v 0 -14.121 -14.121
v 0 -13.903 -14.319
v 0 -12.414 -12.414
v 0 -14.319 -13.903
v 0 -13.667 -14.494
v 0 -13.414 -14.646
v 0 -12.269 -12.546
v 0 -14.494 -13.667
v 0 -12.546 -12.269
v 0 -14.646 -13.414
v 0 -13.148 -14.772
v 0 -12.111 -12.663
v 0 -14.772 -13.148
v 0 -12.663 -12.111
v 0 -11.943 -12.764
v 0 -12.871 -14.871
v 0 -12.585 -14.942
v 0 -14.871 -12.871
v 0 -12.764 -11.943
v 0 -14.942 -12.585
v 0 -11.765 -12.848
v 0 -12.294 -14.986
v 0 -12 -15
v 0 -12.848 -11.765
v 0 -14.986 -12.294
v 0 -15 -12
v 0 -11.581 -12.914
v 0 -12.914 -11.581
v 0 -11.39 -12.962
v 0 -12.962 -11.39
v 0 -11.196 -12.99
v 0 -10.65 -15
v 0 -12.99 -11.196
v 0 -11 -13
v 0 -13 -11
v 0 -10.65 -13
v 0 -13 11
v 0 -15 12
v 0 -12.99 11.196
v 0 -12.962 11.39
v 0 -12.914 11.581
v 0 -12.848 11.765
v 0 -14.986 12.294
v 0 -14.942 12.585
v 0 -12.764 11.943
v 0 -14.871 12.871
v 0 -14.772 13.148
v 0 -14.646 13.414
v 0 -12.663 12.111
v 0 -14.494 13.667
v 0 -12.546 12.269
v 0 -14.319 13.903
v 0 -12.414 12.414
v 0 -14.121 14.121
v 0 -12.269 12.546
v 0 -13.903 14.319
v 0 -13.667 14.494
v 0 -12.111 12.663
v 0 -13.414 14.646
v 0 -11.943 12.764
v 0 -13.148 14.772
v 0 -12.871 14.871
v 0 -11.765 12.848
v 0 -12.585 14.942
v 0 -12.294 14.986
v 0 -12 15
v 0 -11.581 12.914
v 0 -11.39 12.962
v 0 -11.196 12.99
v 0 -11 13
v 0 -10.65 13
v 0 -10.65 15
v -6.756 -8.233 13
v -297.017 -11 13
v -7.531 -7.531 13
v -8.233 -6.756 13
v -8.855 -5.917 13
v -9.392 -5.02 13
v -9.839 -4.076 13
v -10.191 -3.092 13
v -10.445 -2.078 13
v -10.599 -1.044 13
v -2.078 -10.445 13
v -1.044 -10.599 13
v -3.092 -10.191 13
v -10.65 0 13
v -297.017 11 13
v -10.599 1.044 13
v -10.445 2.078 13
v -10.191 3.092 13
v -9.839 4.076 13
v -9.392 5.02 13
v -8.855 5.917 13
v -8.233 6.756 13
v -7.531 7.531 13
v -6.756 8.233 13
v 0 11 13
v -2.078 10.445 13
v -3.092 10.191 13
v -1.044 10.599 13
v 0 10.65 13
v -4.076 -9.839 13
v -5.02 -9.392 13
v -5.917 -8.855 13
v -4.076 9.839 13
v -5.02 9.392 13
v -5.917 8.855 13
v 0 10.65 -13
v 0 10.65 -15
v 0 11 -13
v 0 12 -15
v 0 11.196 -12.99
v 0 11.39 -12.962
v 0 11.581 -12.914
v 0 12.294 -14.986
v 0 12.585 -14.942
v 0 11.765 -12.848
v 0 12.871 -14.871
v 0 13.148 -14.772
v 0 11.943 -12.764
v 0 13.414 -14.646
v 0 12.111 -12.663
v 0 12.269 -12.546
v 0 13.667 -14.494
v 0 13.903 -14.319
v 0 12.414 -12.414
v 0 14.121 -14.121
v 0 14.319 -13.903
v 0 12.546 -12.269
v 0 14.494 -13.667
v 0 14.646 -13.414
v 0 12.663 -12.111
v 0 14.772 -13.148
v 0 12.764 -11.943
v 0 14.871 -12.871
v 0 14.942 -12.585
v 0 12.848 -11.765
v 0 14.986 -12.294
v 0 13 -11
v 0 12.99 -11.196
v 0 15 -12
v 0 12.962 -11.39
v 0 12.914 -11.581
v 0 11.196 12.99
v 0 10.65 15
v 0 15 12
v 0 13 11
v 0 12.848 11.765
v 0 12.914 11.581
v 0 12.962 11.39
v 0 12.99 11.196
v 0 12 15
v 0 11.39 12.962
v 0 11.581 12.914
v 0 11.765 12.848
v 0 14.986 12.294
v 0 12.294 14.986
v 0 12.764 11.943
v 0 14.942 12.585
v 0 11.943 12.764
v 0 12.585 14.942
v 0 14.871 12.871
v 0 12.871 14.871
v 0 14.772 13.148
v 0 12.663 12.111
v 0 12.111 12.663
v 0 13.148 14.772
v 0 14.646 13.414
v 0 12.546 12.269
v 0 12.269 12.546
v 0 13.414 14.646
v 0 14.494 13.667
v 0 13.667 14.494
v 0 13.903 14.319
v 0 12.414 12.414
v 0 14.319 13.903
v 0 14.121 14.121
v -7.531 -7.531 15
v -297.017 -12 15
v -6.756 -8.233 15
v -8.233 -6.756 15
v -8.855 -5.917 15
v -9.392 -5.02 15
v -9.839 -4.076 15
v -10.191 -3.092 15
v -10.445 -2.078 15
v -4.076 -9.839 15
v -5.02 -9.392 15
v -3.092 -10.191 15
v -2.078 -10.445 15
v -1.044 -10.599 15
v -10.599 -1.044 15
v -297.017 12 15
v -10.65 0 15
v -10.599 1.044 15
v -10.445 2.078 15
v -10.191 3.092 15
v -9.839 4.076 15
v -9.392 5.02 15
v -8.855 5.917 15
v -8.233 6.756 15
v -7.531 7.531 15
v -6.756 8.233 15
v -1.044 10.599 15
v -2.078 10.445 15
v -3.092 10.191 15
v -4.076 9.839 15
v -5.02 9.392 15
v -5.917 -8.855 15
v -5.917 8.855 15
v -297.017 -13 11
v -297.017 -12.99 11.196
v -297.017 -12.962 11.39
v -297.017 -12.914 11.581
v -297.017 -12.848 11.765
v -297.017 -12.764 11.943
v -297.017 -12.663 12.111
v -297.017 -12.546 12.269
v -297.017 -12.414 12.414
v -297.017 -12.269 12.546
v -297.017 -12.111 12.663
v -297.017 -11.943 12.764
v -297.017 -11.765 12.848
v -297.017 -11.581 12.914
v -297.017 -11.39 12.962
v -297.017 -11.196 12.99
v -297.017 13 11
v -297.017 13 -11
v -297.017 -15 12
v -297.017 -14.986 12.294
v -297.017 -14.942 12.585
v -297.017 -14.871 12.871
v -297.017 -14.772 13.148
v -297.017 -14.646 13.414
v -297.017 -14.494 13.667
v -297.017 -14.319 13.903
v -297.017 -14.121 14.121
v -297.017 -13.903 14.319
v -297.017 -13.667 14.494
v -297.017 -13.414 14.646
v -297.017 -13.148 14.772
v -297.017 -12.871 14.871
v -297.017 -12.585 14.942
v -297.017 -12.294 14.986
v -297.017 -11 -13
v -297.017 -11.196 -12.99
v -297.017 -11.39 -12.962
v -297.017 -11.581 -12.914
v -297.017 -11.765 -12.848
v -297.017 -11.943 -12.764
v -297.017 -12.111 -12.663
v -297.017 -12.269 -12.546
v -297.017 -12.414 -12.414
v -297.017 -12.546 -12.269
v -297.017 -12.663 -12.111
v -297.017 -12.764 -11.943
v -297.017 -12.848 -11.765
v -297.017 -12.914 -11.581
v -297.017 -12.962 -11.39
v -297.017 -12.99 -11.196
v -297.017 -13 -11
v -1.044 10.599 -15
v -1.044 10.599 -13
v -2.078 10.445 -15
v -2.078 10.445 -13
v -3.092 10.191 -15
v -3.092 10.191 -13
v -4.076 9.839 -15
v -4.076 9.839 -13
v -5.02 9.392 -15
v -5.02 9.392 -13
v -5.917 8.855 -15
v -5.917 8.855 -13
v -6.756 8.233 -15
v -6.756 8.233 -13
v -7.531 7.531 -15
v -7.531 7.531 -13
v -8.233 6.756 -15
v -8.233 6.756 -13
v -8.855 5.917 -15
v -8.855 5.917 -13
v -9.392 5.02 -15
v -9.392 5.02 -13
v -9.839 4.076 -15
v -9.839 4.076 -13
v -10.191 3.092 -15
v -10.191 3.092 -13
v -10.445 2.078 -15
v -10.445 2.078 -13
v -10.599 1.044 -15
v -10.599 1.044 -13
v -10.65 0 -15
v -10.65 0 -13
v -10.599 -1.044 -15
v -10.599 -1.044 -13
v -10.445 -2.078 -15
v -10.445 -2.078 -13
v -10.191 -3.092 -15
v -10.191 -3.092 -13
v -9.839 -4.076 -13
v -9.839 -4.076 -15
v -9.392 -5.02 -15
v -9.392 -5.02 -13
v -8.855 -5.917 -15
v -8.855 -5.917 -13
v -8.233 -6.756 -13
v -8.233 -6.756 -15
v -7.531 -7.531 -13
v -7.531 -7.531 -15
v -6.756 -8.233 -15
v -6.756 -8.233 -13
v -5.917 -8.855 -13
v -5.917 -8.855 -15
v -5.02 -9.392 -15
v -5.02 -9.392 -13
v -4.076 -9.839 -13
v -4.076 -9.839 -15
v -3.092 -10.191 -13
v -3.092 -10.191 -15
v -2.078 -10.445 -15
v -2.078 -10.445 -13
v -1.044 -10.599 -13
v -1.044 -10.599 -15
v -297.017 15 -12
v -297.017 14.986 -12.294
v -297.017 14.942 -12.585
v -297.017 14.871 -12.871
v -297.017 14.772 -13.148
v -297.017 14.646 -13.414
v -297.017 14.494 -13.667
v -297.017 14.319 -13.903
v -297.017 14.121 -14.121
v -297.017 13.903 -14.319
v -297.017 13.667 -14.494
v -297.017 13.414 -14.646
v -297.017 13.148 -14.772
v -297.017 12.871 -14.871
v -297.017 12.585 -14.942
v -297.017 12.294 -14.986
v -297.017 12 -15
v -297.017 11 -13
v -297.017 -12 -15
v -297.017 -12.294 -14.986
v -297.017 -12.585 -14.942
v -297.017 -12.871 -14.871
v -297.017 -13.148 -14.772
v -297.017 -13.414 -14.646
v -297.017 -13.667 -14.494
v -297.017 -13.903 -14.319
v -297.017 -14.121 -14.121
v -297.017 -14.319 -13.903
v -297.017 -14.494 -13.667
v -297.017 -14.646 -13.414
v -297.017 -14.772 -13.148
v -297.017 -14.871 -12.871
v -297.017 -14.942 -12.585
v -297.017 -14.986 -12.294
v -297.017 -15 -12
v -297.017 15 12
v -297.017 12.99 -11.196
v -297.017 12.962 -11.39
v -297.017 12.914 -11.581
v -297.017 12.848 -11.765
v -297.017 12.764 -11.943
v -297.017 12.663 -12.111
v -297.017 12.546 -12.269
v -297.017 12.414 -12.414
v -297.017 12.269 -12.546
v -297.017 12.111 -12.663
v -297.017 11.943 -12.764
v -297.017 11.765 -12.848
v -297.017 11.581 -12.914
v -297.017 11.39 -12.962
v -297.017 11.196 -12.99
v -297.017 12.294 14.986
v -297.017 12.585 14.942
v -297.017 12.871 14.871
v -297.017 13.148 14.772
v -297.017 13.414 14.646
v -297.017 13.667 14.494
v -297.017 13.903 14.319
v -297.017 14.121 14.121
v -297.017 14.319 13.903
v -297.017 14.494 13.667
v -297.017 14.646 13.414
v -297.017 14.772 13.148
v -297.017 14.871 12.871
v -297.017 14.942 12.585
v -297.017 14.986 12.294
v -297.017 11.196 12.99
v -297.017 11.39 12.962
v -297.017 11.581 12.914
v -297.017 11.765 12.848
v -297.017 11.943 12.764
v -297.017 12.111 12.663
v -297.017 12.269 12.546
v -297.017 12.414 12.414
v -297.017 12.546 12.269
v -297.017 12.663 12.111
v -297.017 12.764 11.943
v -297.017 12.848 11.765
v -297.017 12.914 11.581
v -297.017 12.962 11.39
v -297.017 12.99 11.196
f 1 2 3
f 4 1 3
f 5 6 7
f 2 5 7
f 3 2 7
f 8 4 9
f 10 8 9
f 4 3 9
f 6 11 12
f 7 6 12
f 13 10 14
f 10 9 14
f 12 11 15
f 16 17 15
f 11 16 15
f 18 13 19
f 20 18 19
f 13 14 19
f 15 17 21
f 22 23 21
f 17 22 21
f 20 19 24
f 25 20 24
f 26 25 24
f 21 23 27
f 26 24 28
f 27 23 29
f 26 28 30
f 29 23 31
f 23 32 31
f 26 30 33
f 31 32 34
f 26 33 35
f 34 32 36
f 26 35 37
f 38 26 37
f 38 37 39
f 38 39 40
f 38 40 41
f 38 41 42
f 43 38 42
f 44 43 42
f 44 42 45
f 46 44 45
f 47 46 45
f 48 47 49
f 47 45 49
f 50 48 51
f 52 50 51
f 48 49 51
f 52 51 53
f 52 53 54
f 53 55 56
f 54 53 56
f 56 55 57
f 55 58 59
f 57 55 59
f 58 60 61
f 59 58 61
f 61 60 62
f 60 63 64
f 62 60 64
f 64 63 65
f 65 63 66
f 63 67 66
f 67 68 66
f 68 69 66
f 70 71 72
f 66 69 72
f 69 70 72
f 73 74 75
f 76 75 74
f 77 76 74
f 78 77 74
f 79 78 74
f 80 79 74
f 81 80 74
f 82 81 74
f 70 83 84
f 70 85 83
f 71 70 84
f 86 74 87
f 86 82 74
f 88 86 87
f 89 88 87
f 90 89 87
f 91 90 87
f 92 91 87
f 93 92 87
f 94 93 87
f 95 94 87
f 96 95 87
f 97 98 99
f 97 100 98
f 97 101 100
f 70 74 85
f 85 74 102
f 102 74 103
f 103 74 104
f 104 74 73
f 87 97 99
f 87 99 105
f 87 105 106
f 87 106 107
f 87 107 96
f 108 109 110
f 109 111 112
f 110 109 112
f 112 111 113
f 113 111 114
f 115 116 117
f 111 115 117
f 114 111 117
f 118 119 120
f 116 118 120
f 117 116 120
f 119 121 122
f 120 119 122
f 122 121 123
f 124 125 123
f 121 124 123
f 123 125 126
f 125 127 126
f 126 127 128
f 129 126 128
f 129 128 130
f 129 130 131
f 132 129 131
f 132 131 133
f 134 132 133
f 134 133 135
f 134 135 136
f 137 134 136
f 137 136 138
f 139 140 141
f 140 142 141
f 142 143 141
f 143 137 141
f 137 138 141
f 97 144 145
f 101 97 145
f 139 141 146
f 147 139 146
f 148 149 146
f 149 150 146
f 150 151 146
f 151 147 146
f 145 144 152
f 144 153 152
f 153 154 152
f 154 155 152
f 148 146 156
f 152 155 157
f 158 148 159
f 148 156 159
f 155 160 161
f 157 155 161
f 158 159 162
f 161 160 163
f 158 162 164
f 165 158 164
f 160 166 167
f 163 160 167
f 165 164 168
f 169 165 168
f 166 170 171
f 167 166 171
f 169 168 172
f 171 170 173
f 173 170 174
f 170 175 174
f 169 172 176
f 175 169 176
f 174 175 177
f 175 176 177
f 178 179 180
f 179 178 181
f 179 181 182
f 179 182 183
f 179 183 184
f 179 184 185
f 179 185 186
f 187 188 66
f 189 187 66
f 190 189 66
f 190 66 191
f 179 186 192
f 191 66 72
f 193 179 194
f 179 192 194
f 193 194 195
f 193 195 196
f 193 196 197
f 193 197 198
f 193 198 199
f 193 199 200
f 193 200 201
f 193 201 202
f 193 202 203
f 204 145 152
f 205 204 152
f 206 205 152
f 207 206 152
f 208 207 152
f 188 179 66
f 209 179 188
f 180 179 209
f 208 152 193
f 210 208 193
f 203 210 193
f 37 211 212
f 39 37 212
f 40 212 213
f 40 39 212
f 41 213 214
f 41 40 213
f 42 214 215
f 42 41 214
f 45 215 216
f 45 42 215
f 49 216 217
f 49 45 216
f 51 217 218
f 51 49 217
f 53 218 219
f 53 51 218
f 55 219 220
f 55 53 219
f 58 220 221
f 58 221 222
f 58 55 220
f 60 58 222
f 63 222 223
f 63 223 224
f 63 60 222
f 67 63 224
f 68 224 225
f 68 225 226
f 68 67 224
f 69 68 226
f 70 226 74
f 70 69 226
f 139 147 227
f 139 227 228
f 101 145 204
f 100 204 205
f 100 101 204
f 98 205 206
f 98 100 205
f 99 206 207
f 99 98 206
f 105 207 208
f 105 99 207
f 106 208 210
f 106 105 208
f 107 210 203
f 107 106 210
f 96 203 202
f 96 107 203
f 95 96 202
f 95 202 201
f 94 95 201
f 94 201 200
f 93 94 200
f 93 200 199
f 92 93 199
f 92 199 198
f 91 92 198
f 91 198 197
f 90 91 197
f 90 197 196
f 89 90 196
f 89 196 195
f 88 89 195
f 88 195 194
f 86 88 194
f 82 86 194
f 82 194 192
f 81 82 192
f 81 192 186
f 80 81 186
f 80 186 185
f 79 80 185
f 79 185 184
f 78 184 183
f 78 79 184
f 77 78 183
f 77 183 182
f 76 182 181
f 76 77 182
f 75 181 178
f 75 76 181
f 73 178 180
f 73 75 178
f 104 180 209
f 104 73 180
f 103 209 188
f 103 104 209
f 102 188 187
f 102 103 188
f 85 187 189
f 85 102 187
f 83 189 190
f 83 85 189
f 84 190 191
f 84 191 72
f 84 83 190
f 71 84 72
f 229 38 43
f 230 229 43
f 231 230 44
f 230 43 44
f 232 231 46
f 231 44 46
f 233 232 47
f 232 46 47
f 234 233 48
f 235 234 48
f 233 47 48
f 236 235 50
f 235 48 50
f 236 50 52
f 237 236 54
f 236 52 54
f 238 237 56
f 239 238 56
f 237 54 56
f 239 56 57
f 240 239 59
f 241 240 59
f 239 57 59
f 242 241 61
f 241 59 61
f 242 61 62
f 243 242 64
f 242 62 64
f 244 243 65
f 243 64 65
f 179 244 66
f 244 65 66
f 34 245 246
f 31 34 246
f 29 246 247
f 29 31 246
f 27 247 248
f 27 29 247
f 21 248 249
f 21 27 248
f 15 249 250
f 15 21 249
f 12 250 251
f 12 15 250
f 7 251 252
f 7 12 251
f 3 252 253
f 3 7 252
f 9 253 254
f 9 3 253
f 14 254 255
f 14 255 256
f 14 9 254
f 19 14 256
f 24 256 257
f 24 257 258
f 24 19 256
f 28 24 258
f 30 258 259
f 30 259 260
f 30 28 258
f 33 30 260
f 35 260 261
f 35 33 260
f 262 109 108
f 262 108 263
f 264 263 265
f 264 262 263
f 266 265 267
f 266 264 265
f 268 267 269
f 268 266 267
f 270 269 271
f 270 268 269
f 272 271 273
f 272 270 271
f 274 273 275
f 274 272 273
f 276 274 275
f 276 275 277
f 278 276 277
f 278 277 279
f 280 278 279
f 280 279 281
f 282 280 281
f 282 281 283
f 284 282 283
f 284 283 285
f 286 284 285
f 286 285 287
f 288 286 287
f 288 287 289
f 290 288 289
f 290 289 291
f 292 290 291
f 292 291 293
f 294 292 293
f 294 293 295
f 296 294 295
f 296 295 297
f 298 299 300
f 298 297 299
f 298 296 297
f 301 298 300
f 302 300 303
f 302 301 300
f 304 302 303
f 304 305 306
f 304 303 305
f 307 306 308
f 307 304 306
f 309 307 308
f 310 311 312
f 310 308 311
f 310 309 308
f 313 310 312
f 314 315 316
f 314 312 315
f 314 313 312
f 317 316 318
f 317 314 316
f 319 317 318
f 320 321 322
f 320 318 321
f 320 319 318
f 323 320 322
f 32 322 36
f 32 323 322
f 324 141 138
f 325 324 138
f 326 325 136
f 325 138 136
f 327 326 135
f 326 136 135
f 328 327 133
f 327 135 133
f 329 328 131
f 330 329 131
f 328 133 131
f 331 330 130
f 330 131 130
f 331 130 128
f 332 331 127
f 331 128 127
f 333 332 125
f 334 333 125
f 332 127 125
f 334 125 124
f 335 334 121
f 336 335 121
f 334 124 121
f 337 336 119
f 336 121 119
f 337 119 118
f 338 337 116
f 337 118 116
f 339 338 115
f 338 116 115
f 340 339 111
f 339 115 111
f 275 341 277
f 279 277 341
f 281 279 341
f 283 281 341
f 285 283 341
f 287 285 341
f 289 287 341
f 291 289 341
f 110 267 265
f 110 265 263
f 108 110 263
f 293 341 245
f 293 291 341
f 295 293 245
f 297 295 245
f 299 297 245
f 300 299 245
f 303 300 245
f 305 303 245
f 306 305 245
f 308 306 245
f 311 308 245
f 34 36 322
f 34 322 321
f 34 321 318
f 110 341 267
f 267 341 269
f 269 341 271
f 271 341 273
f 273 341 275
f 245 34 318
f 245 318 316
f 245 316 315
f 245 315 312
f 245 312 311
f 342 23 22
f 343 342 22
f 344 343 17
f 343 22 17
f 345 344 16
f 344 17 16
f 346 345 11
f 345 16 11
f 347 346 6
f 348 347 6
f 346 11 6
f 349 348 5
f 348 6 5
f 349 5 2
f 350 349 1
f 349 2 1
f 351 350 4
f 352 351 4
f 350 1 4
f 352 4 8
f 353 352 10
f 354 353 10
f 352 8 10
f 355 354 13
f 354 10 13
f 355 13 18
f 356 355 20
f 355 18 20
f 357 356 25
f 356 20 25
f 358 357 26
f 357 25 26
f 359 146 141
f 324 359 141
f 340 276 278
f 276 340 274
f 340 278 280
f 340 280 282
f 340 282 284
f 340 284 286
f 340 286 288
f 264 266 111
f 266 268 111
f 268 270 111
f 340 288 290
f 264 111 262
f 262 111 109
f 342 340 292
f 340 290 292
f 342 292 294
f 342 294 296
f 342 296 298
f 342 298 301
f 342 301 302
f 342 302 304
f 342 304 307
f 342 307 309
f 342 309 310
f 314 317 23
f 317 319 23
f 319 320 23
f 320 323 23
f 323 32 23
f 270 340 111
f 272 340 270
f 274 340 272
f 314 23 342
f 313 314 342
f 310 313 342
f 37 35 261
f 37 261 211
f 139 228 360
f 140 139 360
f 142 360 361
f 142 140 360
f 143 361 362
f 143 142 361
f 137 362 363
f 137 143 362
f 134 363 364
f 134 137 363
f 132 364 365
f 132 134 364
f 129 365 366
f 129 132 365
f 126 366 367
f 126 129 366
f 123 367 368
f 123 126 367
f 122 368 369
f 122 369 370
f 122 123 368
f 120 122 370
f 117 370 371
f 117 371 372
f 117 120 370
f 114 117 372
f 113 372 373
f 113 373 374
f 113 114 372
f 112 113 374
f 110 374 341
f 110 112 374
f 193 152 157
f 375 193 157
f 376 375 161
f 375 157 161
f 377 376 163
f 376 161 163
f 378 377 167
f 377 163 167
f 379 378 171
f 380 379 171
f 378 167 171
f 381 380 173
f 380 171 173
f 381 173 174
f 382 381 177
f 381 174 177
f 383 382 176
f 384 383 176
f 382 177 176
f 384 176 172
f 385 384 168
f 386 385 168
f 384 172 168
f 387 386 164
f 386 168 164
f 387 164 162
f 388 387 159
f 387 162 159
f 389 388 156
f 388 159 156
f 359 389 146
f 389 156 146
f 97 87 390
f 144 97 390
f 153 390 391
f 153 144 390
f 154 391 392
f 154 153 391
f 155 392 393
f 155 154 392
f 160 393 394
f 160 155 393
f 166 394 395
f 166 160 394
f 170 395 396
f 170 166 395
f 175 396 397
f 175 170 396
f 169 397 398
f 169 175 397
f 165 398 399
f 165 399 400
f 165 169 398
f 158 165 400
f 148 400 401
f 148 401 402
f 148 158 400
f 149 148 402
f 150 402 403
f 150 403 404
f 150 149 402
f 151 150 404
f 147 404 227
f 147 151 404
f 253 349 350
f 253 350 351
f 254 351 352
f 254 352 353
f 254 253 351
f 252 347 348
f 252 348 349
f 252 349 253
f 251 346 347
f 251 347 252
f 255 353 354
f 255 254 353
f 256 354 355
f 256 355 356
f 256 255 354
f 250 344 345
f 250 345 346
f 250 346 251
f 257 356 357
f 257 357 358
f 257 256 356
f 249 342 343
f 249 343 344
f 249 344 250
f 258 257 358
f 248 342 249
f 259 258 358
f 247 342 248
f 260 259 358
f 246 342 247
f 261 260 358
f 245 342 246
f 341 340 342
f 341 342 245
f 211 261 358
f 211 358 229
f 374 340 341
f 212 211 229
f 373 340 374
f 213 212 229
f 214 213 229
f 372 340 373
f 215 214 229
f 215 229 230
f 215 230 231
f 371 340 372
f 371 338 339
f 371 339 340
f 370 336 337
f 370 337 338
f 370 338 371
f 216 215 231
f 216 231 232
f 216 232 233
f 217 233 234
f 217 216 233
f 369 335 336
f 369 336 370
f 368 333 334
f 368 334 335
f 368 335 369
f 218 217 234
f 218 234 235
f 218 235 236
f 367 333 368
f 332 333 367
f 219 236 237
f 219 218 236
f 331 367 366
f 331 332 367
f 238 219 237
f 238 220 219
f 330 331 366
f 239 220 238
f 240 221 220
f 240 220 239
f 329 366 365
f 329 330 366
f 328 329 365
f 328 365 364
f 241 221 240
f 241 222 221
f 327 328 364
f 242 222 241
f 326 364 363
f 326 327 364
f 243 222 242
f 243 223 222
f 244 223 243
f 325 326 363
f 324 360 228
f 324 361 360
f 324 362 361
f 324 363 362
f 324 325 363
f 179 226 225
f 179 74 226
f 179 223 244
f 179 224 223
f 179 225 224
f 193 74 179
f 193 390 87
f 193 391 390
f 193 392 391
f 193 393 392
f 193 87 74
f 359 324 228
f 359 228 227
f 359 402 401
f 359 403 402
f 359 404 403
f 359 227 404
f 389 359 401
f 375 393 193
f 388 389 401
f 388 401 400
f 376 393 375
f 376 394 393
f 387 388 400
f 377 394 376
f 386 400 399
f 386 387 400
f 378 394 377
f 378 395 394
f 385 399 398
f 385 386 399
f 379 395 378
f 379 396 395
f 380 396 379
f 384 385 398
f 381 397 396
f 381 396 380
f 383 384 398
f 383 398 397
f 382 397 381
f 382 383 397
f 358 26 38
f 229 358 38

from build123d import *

# Parameters (mm, degrees)
EXTRUDE_1_DEPTH = 297.016771071
OTHER_START     = -15
OTHER_1_DEPTH   = 30


# Read off the part's stored shape, not the designer's step: Полость1
with BuildPart() as part:
    # Эскиз1 → Бобышка-Вытянуть1 (new body)
    with BuildSketch(Plane(origin=(0, 0, 0), x_dir=(0, 0, -1), z_dir=(1, 0, 0))):
        with BuildLine():
            Line((-12, 15), (12, 15))
            ThreePointArc((12, 15), (14.121320344, 14.121320344), (15, 12))
            Line((15, 12), (15, -12))
            ThreePointArc((15, -12), (14.121320344, -14.121320344), (12, -15))
            Line((12, -15), (-12, -15))
            ThreePointArc((-12, -15), (-14.121320344, -14.121320344), (-15, -12))
            Line((-15, -12), (-15, 12))
            ThreePointArc((-15, 12), (-14.121320344, 14.121320344), (-12, 15))
        make_face()
        with BuildLine():
            Line((-11, 13), (11, 13))
            ThreePointArc((11, 13), (12.414213562, 12.414213562), (13, 11))
            Line((13, 11), (13, -11))
            ThreePointArc((13, -11), (12.414213562, -12.414213562), (11, -13))
            Line((11, -13), (-11, -13))
            ThreePointArc((-11, -13), (-12.414213562, -12.414213562), (-13, -11))
            Line((-13, -11), (-13, 11))
            ThreePointArc((-13, 11), (-12.414213562, 12.414213562), (-11, 13))
        make_face(mode=Mode.SUBTRACT)
    extrude(amount=-EXTRUDE_1_DEPTH)

    # Полость1 outline → Полость1 (cut)
    with BuildSketch(Plane.XY.offset(OTHER_START)):
        with BuildLine():
            Line((0, -10.65), (0, 10.65))
            ThreePointArc((0, 10.65), (-10.65, 0), (0, -10.65))
        make_face()
    extrude(amount=OTHER_1_DEPTH, mode=Mode.SUBTRACT)


solid = part.part
